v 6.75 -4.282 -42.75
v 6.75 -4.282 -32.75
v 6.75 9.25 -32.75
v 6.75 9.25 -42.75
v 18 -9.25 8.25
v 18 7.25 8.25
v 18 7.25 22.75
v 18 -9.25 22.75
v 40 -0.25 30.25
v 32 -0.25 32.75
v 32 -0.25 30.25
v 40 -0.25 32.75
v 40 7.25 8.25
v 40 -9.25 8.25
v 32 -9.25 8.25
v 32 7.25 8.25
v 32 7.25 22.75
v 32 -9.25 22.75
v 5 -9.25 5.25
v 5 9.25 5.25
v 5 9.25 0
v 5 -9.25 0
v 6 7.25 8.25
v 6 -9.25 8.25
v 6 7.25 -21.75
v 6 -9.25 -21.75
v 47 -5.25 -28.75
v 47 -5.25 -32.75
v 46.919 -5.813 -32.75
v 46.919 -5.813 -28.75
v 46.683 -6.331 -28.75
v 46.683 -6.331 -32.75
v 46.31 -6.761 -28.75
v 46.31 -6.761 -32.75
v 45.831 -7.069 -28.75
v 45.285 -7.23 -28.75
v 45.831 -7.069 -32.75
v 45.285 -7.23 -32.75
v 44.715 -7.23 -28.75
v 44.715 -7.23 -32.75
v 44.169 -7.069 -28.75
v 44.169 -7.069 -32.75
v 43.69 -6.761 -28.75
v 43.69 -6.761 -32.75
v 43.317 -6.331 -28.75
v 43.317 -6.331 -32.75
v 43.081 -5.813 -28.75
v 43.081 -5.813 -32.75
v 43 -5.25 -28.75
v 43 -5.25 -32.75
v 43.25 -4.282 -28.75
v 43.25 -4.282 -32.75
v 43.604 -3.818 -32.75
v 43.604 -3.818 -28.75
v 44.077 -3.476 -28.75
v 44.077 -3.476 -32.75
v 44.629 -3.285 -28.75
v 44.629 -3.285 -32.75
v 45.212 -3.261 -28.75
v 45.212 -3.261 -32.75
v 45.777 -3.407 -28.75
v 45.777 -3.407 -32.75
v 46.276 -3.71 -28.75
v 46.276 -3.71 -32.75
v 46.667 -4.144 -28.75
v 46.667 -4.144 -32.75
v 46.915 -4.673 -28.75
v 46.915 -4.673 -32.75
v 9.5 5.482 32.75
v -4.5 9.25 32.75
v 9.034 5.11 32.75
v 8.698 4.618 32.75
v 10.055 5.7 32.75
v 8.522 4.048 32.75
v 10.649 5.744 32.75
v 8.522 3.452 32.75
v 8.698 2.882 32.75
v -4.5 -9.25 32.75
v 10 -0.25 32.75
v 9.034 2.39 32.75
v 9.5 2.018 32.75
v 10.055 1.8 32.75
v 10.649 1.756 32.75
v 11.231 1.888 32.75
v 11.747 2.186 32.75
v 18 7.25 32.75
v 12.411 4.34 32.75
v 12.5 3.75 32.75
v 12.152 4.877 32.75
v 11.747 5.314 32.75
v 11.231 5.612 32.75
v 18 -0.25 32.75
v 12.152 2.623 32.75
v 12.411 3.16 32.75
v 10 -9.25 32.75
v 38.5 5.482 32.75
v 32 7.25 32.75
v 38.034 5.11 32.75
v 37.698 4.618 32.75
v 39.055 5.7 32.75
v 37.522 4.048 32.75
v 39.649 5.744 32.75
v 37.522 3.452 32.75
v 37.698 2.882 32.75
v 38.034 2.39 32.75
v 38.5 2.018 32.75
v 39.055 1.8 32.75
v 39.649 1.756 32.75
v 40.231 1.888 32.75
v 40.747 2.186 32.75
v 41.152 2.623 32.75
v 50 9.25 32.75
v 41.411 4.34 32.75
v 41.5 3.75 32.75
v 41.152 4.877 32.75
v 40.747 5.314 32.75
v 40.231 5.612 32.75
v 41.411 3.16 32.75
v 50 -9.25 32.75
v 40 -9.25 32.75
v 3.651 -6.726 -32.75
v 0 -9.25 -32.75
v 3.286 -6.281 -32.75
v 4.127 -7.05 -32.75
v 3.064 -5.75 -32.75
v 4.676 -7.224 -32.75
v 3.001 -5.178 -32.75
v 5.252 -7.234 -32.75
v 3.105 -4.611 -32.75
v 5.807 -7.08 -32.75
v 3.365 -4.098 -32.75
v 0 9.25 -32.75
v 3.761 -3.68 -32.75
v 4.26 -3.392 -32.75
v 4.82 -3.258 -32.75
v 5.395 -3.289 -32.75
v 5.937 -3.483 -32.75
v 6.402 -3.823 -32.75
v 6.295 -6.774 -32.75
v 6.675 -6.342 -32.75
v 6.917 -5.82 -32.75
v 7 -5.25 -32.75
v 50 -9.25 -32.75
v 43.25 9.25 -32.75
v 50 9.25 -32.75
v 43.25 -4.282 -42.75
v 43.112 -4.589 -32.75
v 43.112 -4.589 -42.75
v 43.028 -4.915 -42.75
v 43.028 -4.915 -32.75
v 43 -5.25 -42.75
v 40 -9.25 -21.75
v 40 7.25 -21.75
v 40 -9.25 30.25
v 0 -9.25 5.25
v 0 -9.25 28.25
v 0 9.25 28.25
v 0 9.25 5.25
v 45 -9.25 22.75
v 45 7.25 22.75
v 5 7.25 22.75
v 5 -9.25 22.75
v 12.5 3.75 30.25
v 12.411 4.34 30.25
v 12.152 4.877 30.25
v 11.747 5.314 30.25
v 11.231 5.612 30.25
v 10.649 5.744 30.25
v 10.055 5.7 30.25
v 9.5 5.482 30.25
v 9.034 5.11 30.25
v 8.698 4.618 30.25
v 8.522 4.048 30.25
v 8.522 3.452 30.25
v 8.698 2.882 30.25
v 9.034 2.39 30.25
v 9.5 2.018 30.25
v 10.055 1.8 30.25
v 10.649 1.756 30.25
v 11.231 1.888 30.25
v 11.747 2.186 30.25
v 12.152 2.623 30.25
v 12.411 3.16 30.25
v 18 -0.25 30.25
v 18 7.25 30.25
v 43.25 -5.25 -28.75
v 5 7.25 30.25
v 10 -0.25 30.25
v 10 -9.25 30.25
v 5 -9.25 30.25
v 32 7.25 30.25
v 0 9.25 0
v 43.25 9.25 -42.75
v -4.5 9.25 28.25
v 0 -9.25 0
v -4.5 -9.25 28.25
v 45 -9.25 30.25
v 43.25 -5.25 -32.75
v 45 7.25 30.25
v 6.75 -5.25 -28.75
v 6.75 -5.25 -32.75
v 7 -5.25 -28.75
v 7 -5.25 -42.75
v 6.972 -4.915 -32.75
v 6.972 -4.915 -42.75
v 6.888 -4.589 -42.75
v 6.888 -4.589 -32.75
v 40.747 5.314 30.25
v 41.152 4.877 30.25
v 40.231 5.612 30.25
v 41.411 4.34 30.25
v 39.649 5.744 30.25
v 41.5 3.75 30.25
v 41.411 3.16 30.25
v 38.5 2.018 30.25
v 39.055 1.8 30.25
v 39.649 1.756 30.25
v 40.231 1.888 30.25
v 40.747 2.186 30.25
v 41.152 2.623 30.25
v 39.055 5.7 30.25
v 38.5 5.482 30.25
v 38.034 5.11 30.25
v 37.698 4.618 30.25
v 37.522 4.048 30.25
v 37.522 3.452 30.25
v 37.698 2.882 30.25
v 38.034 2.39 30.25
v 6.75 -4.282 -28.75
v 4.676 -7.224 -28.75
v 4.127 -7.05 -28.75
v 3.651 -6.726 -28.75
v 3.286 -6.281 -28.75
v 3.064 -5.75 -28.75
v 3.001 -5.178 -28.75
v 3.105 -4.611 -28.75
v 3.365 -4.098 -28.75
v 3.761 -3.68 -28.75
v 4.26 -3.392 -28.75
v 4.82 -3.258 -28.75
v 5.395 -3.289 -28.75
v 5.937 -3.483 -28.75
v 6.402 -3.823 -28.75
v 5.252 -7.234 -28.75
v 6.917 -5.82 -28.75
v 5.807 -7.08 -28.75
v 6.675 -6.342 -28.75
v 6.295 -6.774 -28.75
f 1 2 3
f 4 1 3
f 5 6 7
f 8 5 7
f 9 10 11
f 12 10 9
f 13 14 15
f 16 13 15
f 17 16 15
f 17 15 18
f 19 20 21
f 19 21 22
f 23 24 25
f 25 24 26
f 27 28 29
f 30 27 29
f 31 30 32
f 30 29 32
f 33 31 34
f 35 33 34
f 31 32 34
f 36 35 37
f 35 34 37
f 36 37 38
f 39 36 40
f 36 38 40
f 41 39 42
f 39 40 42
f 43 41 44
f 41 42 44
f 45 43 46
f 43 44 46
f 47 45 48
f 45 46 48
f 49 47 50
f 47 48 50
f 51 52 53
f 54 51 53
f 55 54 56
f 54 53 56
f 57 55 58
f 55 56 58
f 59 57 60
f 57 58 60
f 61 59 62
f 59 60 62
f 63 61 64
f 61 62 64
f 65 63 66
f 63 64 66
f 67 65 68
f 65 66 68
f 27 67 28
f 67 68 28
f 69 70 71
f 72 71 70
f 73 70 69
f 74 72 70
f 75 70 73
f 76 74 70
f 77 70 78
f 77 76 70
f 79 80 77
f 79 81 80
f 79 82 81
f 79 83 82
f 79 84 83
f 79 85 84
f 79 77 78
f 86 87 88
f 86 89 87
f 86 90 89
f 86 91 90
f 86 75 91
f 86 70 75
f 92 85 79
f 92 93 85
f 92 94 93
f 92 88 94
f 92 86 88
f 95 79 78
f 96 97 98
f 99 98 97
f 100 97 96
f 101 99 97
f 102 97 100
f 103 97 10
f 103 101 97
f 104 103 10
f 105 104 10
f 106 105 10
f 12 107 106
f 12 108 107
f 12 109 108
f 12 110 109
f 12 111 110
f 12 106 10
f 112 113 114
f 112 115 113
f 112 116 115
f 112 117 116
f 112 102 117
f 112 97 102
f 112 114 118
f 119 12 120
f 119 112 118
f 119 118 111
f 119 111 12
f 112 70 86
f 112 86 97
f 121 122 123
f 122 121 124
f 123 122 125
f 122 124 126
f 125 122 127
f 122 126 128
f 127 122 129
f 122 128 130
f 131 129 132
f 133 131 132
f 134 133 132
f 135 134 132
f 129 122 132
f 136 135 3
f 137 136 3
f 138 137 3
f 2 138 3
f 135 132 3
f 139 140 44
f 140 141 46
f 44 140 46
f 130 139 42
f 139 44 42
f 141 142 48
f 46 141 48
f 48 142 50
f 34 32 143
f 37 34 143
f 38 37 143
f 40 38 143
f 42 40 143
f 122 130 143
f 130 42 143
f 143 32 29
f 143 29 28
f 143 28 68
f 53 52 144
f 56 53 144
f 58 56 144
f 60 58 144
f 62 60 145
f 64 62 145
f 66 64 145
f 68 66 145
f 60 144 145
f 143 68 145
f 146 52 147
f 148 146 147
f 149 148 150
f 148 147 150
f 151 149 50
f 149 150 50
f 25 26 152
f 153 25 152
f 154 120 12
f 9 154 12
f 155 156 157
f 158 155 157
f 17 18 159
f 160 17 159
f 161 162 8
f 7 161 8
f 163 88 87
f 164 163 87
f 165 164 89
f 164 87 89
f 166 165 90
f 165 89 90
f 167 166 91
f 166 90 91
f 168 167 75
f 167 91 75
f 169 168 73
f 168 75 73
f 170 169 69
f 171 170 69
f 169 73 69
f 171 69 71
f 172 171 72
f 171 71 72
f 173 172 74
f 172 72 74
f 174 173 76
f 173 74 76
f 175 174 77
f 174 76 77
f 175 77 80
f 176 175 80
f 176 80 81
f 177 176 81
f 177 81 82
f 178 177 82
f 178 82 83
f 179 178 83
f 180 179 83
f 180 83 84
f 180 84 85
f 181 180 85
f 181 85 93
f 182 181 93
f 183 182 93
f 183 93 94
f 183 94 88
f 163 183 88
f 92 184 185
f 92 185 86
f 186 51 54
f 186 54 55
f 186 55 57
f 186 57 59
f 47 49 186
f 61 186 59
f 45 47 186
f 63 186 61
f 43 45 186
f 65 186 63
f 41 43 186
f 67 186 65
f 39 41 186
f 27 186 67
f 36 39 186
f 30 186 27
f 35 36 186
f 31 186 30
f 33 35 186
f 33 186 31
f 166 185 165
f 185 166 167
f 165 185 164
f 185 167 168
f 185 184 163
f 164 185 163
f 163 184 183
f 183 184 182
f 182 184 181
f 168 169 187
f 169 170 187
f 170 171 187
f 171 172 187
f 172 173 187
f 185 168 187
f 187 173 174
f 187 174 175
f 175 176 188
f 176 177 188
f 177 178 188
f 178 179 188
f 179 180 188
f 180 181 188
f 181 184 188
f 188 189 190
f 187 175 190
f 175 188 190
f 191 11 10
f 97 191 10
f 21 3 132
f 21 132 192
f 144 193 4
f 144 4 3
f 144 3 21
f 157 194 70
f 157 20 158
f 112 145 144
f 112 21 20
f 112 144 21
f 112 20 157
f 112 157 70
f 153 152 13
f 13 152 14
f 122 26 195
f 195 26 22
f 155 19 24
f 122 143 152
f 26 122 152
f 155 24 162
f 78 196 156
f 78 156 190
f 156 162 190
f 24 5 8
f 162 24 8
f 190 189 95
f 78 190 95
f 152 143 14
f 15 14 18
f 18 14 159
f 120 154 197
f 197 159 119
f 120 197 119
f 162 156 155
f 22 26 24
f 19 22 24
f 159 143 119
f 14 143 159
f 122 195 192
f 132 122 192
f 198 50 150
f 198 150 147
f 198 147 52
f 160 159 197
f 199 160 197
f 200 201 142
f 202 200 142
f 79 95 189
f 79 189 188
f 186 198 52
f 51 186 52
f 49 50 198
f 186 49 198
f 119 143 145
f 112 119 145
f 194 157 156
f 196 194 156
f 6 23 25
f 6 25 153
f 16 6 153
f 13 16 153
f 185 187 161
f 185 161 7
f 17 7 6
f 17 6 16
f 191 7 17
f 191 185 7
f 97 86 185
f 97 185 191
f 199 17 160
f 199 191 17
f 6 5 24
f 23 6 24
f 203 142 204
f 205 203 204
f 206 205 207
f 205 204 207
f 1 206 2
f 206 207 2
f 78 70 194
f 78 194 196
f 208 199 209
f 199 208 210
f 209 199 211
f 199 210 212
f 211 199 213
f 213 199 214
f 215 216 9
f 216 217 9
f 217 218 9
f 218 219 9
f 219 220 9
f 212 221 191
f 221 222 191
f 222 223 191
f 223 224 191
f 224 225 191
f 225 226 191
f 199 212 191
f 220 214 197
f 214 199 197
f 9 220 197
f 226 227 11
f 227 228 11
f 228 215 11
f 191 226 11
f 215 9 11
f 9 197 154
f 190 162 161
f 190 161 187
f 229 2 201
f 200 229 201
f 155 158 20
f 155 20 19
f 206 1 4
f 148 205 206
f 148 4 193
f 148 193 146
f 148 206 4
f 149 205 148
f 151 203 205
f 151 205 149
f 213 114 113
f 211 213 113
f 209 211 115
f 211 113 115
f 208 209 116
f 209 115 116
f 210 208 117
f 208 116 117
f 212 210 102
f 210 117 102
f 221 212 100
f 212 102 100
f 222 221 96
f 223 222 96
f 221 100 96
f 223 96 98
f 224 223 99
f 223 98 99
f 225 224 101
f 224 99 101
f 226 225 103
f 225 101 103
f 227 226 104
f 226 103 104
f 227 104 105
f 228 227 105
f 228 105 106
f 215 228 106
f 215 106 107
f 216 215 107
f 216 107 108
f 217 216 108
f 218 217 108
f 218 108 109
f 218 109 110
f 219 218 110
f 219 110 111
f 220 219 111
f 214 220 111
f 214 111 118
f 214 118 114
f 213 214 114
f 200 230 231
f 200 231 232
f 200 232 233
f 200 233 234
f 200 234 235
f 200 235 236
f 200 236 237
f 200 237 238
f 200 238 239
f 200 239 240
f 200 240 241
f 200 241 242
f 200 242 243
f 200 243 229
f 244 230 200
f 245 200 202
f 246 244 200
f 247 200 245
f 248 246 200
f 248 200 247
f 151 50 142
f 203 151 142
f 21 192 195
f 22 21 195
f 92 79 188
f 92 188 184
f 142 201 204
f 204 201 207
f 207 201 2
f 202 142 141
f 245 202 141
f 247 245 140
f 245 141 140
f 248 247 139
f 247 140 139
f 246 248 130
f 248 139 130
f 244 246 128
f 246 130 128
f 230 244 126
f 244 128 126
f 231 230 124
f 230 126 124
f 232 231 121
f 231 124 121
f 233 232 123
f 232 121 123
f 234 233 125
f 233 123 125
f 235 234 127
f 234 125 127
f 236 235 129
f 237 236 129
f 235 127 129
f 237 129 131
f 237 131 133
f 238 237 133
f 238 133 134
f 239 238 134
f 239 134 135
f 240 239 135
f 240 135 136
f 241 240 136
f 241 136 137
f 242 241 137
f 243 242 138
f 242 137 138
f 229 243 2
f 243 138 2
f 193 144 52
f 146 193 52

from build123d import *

# Parameters (mm, degrees)
F0_W      = 50
F0_H      = 18.5
F1_DEPTH  = 32.75
F2_R      = 2
F2_W      = 30
F2_H      = 9
F3_DEPTH  = 4
F5_DEPTH  = 10
F6_DEPTH  = 4
F7_W      = 14
F7_H      = 14.5
F7_W_2    = 13
F7_H_2    = 7.5
F7_H_3    = 2.5
F8_DEPTH  = 16.5
F9_W      = 18.5
F9_H      = 4.5
F10_DEPTH = 4.5
F9_H_2    = 5.25
F11_DEPTH = 5


with BuildPart() as f1:
    # F0 (on Top) → F1 (new body, symmetric)
    with BuildSketch(Plane.XY):
        with Locations((25, 0)):
            Rectangle(F0_W, F0_H)
    extrude(amount=F1_DEPTH, both=True)

    # F2 (on face) → F3 (cut)
    with BuildSketch(Plane.XY.offset(32.75)):
        with Locations((10.5, 3.75)):
            Circle(F2_R)
        with Locations((39.5, 3.75)):
            Circle(F2_R)
        with Locations((25, -4.75)):
            Rectangle(F2_W, F2_H)
    extrude(amount=-F3_DEPTH, mode=Mode.SUBTRACT)

    # F4 (on face) → F5 (join)
    with BuildSketch(Plane(origin=(0, 0, -32.75), x_dir=(1, 0, 0), z_dir=(0, 0, -1))):
        with BuildLine():
            Line((43, 5.25), (7, 5.25))
            ThreePointArc((7, 5.25), (6.9364916731, 4.75), (6.75, 4.2817541634))
            Line((6.75, 4.2817541634), (6.75, -9.25))
            Line((6.75, -9.25), (43.25, -9.25))
            Line((43.25, -9.25), (43.25, 4.2817541634))
            ThreePointArc((43.25, 4.2817541634), (43.0635083269, 4.75), (43, 5.25))
        make_face()
    extrude(amount=F5_DEPTH)

    # F4 (on face) → F6 (cut)
    with BuildSketch(Plane(origin=(0, 0, -32.75), x_dir=(1, 0, 0), z_dir=(0, 0, -1))):
        with BuildLine():
            Line((6.75, 5.25), (7, 5.25))
            ThreePointArc((7, 5.25), (3.0635083269, 5.75), (6.75, 4.2817541634))
            Line((6.75, 4.2817541634), (6.75, 5.25))
        make_face()
        with BuildLine():
            ThreePointArc((47, 5.25), (45, 7.25), (43, 5.25))
            Line((43, 5.25), (43.25, 5.25))
            Line((43.25, 5.25), (43.25, 4.2817541634))
            ThreePointArc((43.25, 4.2817541634), (45.5, 3.3135083269), (47, 5.25))
        make_face()
    extrude(amount=-F6_DEPTH, mode=Mode.SUBTRACT)

    # F7 (on face) → F8 (cut)
    with BuildSketch(Plane.XZ.offset(9.25)):
        Polygon((18, 8.25), (6, 8.25), (6, -21.75), (40, -21.75), (40, 8.25), (32, 8.25), align=None)
        with Locations((25, 15.5)):
            Rectangle(F7_W, F7_H)
        with Locations((11.5, 26.5)):
            Rectangle(F7_W_2, F7_H_2)
        with Locations((25, 26.5)):
            Rectangle(F7_W, F7_H_2)
        with Locations((38.5, 26.5)):
            Rectangle(F7_W_2, F7_H_2)
        with Locations((25, 31.5)):
            Rectangle(F7_W, F7_H_3)
    extrude(amount=-F8_DEPTH, mode=Mode.SUBTRACT)

    # F9 (on face) → F10 (join)
    with BuildSketch(Plane(origin=(0, 0, 0), x_dir=(0, -1, 0), z_dir=(-1, 0, 0))):
        with Locations((0, 30.5)):
            Rectangle(F9_W, F9_H)
    extrude(amount=F10_DEPTH)

    # F9 (on face) → F11 (cut)
    with BuildSketch(Plane(origin=(0, 0, 0), x_dir=(0, -1, 0), z_dir=(-1, 0, 0))):
        with Locations((0, 2.625)):
            Rectangle(F9_W, F9_H_2)
    extrude(amount=-F11_DEPTH, mode=Mode.SUBTRACT)


solid = f1.part
